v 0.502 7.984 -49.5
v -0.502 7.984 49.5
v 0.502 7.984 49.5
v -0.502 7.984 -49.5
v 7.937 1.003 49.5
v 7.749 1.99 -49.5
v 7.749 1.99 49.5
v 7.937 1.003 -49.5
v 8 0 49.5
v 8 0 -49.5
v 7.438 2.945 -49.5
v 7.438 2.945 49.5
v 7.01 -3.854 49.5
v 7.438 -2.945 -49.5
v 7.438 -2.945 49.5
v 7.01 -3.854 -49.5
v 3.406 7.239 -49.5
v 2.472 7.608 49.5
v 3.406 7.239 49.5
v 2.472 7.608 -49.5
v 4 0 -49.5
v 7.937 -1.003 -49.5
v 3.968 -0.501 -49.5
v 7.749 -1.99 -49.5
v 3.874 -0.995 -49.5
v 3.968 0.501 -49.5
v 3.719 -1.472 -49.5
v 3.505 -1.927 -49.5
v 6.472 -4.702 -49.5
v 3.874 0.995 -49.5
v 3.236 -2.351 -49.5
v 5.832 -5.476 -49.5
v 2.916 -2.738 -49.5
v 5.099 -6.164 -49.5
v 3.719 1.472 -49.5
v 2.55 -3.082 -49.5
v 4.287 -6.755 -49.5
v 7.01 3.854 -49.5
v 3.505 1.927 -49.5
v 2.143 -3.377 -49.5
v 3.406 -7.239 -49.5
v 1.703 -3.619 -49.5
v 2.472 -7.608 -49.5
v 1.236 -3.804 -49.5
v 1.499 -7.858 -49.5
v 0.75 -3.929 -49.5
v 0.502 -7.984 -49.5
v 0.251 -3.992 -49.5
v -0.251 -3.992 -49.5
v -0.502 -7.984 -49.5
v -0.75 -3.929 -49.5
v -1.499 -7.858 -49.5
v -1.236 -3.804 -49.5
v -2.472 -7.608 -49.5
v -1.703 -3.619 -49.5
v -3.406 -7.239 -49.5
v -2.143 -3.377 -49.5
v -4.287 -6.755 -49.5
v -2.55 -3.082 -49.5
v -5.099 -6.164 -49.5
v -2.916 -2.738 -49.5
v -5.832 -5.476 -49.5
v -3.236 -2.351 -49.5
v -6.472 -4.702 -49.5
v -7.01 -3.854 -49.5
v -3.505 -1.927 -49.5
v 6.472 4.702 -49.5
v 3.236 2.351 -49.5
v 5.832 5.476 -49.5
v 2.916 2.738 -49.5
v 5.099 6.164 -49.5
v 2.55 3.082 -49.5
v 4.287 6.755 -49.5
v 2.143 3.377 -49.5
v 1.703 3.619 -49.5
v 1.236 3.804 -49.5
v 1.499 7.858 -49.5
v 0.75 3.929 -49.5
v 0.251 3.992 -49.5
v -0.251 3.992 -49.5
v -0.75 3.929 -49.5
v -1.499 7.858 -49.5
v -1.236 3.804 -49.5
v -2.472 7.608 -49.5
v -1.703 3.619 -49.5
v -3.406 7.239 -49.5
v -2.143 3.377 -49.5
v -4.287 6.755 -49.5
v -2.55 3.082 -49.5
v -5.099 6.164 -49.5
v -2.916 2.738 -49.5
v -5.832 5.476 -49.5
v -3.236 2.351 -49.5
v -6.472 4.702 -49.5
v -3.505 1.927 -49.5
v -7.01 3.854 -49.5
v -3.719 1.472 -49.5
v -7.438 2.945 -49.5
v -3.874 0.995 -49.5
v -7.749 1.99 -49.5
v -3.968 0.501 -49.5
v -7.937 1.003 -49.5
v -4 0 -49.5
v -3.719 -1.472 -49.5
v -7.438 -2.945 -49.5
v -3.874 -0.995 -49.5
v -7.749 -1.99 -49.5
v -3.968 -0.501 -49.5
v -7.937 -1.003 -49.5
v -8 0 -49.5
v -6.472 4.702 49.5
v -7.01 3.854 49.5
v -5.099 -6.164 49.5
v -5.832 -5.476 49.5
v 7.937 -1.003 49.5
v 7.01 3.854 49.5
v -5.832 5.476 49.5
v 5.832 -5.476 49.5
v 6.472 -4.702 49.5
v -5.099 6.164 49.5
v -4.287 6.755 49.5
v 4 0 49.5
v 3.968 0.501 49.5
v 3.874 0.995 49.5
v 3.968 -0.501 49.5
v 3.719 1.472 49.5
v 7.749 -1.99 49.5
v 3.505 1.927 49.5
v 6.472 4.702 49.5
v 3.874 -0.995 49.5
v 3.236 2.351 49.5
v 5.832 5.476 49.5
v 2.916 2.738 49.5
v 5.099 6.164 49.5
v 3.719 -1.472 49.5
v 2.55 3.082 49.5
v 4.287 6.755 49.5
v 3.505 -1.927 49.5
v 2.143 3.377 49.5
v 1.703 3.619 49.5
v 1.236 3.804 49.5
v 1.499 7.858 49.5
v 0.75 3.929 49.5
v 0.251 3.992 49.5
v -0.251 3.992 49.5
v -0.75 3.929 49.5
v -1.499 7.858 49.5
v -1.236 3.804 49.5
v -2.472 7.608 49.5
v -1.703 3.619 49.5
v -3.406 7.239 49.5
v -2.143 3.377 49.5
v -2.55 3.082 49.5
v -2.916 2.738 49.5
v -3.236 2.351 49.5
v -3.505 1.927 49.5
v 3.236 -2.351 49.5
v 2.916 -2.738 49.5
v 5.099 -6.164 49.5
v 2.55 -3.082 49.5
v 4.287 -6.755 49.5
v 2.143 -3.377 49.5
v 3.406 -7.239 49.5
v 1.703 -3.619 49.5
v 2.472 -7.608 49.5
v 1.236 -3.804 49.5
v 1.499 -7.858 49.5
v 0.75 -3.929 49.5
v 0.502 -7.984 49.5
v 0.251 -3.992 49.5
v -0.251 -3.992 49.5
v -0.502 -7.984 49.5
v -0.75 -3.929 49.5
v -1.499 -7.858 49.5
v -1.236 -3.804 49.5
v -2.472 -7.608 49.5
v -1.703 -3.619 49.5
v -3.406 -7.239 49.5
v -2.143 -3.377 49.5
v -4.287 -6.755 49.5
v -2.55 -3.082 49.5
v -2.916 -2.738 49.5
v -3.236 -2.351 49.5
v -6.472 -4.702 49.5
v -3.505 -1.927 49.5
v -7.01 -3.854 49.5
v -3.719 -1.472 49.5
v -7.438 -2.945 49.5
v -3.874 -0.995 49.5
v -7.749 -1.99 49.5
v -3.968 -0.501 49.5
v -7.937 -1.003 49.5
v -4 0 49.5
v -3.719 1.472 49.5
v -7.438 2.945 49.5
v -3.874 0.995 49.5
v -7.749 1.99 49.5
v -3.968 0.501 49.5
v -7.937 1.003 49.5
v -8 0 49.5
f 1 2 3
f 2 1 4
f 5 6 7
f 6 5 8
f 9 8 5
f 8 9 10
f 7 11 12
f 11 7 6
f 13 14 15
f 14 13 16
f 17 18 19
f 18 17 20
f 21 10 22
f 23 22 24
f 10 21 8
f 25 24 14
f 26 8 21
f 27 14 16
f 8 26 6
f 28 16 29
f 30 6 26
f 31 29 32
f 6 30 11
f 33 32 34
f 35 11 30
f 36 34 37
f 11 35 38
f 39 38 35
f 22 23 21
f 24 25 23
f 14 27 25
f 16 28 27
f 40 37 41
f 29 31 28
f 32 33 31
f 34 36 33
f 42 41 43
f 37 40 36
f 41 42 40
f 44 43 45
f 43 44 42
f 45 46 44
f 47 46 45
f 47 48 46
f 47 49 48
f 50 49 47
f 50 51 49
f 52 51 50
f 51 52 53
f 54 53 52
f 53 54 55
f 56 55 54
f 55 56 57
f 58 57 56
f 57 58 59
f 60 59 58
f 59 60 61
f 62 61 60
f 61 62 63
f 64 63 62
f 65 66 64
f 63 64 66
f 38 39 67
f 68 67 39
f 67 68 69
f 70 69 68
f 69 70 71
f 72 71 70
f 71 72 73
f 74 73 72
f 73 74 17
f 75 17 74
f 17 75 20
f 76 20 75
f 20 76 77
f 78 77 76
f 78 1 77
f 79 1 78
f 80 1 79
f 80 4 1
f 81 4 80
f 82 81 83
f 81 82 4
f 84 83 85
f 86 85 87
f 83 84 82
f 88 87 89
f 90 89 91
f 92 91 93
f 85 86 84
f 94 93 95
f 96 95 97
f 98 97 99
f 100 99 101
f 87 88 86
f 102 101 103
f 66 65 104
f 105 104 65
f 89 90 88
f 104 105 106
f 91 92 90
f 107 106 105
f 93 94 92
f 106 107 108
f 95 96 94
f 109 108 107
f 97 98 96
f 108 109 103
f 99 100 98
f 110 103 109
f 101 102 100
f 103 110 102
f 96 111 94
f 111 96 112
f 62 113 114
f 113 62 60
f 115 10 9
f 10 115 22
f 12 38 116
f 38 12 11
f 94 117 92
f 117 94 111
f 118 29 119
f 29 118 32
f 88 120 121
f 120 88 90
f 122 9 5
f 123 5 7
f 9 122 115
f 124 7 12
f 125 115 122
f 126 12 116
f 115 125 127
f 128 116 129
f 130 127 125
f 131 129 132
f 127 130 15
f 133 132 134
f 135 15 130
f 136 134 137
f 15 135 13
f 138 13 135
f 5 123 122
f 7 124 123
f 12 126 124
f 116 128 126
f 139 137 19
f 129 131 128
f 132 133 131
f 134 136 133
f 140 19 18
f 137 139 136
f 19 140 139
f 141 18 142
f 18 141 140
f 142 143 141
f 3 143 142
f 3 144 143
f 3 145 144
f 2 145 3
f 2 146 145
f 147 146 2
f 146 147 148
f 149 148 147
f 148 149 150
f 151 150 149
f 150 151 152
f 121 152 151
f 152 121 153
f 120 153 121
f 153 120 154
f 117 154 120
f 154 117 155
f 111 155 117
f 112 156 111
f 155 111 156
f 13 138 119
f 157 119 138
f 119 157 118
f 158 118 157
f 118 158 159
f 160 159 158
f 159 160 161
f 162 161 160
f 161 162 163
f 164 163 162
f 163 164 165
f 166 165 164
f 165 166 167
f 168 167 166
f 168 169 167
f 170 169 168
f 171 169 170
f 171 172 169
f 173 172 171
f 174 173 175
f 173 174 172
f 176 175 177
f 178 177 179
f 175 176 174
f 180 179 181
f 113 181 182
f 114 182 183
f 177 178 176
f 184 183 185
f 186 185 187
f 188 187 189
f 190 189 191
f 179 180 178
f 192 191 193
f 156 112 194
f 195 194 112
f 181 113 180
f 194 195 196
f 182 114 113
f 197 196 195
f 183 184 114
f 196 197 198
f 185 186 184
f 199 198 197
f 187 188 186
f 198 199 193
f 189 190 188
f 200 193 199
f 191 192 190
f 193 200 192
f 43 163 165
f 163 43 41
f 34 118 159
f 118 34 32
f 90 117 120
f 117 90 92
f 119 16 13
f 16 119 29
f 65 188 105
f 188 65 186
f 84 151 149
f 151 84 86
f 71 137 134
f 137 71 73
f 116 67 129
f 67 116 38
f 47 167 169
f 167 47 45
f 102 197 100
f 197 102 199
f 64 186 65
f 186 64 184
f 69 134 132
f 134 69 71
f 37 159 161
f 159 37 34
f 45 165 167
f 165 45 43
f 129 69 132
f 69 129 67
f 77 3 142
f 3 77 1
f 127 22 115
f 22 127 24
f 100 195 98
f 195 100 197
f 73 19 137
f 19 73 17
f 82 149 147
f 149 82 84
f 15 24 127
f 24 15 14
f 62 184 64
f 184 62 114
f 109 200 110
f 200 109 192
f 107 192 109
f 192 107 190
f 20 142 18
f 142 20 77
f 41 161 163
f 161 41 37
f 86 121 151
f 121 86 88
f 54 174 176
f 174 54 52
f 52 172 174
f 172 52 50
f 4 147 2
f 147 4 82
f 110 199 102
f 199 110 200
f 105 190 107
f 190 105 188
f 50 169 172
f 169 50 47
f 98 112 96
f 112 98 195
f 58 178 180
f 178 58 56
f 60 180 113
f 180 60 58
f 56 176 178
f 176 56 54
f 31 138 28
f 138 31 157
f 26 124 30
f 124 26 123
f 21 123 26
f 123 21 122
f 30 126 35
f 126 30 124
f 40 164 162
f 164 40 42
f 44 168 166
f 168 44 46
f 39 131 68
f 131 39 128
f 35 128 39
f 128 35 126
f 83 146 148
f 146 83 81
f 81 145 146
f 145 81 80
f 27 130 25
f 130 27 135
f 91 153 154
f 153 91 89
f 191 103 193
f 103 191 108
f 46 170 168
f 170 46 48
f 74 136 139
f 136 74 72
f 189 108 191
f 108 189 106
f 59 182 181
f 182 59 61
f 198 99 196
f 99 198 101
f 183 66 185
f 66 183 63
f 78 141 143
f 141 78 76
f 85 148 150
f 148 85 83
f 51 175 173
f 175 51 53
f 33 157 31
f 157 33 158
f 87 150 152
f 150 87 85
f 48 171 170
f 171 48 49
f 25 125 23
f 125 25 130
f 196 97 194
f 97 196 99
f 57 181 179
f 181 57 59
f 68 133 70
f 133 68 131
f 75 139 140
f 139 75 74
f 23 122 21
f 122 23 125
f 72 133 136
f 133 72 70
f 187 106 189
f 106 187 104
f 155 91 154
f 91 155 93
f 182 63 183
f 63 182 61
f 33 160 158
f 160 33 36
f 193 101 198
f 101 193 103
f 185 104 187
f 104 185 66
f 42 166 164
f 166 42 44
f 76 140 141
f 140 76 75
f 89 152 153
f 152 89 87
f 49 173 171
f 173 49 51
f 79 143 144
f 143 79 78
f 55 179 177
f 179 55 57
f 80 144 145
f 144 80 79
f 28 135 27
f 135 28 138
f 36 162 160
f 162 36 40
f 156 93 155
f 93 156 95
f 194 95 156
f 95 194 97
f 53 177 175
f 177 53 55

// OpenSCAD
$fn = 50;


difference() {
	union() {
		translate(v = [0, 0, -49.5000000000]) {
			cylinder(h = 99, r = 8.0000000000);
		}
	}
	union() {
		translate(v = [0, 0, -100.0000000000]) {
			cylinder(h = 200, r = 4.0000000000);
		}
	}
}
